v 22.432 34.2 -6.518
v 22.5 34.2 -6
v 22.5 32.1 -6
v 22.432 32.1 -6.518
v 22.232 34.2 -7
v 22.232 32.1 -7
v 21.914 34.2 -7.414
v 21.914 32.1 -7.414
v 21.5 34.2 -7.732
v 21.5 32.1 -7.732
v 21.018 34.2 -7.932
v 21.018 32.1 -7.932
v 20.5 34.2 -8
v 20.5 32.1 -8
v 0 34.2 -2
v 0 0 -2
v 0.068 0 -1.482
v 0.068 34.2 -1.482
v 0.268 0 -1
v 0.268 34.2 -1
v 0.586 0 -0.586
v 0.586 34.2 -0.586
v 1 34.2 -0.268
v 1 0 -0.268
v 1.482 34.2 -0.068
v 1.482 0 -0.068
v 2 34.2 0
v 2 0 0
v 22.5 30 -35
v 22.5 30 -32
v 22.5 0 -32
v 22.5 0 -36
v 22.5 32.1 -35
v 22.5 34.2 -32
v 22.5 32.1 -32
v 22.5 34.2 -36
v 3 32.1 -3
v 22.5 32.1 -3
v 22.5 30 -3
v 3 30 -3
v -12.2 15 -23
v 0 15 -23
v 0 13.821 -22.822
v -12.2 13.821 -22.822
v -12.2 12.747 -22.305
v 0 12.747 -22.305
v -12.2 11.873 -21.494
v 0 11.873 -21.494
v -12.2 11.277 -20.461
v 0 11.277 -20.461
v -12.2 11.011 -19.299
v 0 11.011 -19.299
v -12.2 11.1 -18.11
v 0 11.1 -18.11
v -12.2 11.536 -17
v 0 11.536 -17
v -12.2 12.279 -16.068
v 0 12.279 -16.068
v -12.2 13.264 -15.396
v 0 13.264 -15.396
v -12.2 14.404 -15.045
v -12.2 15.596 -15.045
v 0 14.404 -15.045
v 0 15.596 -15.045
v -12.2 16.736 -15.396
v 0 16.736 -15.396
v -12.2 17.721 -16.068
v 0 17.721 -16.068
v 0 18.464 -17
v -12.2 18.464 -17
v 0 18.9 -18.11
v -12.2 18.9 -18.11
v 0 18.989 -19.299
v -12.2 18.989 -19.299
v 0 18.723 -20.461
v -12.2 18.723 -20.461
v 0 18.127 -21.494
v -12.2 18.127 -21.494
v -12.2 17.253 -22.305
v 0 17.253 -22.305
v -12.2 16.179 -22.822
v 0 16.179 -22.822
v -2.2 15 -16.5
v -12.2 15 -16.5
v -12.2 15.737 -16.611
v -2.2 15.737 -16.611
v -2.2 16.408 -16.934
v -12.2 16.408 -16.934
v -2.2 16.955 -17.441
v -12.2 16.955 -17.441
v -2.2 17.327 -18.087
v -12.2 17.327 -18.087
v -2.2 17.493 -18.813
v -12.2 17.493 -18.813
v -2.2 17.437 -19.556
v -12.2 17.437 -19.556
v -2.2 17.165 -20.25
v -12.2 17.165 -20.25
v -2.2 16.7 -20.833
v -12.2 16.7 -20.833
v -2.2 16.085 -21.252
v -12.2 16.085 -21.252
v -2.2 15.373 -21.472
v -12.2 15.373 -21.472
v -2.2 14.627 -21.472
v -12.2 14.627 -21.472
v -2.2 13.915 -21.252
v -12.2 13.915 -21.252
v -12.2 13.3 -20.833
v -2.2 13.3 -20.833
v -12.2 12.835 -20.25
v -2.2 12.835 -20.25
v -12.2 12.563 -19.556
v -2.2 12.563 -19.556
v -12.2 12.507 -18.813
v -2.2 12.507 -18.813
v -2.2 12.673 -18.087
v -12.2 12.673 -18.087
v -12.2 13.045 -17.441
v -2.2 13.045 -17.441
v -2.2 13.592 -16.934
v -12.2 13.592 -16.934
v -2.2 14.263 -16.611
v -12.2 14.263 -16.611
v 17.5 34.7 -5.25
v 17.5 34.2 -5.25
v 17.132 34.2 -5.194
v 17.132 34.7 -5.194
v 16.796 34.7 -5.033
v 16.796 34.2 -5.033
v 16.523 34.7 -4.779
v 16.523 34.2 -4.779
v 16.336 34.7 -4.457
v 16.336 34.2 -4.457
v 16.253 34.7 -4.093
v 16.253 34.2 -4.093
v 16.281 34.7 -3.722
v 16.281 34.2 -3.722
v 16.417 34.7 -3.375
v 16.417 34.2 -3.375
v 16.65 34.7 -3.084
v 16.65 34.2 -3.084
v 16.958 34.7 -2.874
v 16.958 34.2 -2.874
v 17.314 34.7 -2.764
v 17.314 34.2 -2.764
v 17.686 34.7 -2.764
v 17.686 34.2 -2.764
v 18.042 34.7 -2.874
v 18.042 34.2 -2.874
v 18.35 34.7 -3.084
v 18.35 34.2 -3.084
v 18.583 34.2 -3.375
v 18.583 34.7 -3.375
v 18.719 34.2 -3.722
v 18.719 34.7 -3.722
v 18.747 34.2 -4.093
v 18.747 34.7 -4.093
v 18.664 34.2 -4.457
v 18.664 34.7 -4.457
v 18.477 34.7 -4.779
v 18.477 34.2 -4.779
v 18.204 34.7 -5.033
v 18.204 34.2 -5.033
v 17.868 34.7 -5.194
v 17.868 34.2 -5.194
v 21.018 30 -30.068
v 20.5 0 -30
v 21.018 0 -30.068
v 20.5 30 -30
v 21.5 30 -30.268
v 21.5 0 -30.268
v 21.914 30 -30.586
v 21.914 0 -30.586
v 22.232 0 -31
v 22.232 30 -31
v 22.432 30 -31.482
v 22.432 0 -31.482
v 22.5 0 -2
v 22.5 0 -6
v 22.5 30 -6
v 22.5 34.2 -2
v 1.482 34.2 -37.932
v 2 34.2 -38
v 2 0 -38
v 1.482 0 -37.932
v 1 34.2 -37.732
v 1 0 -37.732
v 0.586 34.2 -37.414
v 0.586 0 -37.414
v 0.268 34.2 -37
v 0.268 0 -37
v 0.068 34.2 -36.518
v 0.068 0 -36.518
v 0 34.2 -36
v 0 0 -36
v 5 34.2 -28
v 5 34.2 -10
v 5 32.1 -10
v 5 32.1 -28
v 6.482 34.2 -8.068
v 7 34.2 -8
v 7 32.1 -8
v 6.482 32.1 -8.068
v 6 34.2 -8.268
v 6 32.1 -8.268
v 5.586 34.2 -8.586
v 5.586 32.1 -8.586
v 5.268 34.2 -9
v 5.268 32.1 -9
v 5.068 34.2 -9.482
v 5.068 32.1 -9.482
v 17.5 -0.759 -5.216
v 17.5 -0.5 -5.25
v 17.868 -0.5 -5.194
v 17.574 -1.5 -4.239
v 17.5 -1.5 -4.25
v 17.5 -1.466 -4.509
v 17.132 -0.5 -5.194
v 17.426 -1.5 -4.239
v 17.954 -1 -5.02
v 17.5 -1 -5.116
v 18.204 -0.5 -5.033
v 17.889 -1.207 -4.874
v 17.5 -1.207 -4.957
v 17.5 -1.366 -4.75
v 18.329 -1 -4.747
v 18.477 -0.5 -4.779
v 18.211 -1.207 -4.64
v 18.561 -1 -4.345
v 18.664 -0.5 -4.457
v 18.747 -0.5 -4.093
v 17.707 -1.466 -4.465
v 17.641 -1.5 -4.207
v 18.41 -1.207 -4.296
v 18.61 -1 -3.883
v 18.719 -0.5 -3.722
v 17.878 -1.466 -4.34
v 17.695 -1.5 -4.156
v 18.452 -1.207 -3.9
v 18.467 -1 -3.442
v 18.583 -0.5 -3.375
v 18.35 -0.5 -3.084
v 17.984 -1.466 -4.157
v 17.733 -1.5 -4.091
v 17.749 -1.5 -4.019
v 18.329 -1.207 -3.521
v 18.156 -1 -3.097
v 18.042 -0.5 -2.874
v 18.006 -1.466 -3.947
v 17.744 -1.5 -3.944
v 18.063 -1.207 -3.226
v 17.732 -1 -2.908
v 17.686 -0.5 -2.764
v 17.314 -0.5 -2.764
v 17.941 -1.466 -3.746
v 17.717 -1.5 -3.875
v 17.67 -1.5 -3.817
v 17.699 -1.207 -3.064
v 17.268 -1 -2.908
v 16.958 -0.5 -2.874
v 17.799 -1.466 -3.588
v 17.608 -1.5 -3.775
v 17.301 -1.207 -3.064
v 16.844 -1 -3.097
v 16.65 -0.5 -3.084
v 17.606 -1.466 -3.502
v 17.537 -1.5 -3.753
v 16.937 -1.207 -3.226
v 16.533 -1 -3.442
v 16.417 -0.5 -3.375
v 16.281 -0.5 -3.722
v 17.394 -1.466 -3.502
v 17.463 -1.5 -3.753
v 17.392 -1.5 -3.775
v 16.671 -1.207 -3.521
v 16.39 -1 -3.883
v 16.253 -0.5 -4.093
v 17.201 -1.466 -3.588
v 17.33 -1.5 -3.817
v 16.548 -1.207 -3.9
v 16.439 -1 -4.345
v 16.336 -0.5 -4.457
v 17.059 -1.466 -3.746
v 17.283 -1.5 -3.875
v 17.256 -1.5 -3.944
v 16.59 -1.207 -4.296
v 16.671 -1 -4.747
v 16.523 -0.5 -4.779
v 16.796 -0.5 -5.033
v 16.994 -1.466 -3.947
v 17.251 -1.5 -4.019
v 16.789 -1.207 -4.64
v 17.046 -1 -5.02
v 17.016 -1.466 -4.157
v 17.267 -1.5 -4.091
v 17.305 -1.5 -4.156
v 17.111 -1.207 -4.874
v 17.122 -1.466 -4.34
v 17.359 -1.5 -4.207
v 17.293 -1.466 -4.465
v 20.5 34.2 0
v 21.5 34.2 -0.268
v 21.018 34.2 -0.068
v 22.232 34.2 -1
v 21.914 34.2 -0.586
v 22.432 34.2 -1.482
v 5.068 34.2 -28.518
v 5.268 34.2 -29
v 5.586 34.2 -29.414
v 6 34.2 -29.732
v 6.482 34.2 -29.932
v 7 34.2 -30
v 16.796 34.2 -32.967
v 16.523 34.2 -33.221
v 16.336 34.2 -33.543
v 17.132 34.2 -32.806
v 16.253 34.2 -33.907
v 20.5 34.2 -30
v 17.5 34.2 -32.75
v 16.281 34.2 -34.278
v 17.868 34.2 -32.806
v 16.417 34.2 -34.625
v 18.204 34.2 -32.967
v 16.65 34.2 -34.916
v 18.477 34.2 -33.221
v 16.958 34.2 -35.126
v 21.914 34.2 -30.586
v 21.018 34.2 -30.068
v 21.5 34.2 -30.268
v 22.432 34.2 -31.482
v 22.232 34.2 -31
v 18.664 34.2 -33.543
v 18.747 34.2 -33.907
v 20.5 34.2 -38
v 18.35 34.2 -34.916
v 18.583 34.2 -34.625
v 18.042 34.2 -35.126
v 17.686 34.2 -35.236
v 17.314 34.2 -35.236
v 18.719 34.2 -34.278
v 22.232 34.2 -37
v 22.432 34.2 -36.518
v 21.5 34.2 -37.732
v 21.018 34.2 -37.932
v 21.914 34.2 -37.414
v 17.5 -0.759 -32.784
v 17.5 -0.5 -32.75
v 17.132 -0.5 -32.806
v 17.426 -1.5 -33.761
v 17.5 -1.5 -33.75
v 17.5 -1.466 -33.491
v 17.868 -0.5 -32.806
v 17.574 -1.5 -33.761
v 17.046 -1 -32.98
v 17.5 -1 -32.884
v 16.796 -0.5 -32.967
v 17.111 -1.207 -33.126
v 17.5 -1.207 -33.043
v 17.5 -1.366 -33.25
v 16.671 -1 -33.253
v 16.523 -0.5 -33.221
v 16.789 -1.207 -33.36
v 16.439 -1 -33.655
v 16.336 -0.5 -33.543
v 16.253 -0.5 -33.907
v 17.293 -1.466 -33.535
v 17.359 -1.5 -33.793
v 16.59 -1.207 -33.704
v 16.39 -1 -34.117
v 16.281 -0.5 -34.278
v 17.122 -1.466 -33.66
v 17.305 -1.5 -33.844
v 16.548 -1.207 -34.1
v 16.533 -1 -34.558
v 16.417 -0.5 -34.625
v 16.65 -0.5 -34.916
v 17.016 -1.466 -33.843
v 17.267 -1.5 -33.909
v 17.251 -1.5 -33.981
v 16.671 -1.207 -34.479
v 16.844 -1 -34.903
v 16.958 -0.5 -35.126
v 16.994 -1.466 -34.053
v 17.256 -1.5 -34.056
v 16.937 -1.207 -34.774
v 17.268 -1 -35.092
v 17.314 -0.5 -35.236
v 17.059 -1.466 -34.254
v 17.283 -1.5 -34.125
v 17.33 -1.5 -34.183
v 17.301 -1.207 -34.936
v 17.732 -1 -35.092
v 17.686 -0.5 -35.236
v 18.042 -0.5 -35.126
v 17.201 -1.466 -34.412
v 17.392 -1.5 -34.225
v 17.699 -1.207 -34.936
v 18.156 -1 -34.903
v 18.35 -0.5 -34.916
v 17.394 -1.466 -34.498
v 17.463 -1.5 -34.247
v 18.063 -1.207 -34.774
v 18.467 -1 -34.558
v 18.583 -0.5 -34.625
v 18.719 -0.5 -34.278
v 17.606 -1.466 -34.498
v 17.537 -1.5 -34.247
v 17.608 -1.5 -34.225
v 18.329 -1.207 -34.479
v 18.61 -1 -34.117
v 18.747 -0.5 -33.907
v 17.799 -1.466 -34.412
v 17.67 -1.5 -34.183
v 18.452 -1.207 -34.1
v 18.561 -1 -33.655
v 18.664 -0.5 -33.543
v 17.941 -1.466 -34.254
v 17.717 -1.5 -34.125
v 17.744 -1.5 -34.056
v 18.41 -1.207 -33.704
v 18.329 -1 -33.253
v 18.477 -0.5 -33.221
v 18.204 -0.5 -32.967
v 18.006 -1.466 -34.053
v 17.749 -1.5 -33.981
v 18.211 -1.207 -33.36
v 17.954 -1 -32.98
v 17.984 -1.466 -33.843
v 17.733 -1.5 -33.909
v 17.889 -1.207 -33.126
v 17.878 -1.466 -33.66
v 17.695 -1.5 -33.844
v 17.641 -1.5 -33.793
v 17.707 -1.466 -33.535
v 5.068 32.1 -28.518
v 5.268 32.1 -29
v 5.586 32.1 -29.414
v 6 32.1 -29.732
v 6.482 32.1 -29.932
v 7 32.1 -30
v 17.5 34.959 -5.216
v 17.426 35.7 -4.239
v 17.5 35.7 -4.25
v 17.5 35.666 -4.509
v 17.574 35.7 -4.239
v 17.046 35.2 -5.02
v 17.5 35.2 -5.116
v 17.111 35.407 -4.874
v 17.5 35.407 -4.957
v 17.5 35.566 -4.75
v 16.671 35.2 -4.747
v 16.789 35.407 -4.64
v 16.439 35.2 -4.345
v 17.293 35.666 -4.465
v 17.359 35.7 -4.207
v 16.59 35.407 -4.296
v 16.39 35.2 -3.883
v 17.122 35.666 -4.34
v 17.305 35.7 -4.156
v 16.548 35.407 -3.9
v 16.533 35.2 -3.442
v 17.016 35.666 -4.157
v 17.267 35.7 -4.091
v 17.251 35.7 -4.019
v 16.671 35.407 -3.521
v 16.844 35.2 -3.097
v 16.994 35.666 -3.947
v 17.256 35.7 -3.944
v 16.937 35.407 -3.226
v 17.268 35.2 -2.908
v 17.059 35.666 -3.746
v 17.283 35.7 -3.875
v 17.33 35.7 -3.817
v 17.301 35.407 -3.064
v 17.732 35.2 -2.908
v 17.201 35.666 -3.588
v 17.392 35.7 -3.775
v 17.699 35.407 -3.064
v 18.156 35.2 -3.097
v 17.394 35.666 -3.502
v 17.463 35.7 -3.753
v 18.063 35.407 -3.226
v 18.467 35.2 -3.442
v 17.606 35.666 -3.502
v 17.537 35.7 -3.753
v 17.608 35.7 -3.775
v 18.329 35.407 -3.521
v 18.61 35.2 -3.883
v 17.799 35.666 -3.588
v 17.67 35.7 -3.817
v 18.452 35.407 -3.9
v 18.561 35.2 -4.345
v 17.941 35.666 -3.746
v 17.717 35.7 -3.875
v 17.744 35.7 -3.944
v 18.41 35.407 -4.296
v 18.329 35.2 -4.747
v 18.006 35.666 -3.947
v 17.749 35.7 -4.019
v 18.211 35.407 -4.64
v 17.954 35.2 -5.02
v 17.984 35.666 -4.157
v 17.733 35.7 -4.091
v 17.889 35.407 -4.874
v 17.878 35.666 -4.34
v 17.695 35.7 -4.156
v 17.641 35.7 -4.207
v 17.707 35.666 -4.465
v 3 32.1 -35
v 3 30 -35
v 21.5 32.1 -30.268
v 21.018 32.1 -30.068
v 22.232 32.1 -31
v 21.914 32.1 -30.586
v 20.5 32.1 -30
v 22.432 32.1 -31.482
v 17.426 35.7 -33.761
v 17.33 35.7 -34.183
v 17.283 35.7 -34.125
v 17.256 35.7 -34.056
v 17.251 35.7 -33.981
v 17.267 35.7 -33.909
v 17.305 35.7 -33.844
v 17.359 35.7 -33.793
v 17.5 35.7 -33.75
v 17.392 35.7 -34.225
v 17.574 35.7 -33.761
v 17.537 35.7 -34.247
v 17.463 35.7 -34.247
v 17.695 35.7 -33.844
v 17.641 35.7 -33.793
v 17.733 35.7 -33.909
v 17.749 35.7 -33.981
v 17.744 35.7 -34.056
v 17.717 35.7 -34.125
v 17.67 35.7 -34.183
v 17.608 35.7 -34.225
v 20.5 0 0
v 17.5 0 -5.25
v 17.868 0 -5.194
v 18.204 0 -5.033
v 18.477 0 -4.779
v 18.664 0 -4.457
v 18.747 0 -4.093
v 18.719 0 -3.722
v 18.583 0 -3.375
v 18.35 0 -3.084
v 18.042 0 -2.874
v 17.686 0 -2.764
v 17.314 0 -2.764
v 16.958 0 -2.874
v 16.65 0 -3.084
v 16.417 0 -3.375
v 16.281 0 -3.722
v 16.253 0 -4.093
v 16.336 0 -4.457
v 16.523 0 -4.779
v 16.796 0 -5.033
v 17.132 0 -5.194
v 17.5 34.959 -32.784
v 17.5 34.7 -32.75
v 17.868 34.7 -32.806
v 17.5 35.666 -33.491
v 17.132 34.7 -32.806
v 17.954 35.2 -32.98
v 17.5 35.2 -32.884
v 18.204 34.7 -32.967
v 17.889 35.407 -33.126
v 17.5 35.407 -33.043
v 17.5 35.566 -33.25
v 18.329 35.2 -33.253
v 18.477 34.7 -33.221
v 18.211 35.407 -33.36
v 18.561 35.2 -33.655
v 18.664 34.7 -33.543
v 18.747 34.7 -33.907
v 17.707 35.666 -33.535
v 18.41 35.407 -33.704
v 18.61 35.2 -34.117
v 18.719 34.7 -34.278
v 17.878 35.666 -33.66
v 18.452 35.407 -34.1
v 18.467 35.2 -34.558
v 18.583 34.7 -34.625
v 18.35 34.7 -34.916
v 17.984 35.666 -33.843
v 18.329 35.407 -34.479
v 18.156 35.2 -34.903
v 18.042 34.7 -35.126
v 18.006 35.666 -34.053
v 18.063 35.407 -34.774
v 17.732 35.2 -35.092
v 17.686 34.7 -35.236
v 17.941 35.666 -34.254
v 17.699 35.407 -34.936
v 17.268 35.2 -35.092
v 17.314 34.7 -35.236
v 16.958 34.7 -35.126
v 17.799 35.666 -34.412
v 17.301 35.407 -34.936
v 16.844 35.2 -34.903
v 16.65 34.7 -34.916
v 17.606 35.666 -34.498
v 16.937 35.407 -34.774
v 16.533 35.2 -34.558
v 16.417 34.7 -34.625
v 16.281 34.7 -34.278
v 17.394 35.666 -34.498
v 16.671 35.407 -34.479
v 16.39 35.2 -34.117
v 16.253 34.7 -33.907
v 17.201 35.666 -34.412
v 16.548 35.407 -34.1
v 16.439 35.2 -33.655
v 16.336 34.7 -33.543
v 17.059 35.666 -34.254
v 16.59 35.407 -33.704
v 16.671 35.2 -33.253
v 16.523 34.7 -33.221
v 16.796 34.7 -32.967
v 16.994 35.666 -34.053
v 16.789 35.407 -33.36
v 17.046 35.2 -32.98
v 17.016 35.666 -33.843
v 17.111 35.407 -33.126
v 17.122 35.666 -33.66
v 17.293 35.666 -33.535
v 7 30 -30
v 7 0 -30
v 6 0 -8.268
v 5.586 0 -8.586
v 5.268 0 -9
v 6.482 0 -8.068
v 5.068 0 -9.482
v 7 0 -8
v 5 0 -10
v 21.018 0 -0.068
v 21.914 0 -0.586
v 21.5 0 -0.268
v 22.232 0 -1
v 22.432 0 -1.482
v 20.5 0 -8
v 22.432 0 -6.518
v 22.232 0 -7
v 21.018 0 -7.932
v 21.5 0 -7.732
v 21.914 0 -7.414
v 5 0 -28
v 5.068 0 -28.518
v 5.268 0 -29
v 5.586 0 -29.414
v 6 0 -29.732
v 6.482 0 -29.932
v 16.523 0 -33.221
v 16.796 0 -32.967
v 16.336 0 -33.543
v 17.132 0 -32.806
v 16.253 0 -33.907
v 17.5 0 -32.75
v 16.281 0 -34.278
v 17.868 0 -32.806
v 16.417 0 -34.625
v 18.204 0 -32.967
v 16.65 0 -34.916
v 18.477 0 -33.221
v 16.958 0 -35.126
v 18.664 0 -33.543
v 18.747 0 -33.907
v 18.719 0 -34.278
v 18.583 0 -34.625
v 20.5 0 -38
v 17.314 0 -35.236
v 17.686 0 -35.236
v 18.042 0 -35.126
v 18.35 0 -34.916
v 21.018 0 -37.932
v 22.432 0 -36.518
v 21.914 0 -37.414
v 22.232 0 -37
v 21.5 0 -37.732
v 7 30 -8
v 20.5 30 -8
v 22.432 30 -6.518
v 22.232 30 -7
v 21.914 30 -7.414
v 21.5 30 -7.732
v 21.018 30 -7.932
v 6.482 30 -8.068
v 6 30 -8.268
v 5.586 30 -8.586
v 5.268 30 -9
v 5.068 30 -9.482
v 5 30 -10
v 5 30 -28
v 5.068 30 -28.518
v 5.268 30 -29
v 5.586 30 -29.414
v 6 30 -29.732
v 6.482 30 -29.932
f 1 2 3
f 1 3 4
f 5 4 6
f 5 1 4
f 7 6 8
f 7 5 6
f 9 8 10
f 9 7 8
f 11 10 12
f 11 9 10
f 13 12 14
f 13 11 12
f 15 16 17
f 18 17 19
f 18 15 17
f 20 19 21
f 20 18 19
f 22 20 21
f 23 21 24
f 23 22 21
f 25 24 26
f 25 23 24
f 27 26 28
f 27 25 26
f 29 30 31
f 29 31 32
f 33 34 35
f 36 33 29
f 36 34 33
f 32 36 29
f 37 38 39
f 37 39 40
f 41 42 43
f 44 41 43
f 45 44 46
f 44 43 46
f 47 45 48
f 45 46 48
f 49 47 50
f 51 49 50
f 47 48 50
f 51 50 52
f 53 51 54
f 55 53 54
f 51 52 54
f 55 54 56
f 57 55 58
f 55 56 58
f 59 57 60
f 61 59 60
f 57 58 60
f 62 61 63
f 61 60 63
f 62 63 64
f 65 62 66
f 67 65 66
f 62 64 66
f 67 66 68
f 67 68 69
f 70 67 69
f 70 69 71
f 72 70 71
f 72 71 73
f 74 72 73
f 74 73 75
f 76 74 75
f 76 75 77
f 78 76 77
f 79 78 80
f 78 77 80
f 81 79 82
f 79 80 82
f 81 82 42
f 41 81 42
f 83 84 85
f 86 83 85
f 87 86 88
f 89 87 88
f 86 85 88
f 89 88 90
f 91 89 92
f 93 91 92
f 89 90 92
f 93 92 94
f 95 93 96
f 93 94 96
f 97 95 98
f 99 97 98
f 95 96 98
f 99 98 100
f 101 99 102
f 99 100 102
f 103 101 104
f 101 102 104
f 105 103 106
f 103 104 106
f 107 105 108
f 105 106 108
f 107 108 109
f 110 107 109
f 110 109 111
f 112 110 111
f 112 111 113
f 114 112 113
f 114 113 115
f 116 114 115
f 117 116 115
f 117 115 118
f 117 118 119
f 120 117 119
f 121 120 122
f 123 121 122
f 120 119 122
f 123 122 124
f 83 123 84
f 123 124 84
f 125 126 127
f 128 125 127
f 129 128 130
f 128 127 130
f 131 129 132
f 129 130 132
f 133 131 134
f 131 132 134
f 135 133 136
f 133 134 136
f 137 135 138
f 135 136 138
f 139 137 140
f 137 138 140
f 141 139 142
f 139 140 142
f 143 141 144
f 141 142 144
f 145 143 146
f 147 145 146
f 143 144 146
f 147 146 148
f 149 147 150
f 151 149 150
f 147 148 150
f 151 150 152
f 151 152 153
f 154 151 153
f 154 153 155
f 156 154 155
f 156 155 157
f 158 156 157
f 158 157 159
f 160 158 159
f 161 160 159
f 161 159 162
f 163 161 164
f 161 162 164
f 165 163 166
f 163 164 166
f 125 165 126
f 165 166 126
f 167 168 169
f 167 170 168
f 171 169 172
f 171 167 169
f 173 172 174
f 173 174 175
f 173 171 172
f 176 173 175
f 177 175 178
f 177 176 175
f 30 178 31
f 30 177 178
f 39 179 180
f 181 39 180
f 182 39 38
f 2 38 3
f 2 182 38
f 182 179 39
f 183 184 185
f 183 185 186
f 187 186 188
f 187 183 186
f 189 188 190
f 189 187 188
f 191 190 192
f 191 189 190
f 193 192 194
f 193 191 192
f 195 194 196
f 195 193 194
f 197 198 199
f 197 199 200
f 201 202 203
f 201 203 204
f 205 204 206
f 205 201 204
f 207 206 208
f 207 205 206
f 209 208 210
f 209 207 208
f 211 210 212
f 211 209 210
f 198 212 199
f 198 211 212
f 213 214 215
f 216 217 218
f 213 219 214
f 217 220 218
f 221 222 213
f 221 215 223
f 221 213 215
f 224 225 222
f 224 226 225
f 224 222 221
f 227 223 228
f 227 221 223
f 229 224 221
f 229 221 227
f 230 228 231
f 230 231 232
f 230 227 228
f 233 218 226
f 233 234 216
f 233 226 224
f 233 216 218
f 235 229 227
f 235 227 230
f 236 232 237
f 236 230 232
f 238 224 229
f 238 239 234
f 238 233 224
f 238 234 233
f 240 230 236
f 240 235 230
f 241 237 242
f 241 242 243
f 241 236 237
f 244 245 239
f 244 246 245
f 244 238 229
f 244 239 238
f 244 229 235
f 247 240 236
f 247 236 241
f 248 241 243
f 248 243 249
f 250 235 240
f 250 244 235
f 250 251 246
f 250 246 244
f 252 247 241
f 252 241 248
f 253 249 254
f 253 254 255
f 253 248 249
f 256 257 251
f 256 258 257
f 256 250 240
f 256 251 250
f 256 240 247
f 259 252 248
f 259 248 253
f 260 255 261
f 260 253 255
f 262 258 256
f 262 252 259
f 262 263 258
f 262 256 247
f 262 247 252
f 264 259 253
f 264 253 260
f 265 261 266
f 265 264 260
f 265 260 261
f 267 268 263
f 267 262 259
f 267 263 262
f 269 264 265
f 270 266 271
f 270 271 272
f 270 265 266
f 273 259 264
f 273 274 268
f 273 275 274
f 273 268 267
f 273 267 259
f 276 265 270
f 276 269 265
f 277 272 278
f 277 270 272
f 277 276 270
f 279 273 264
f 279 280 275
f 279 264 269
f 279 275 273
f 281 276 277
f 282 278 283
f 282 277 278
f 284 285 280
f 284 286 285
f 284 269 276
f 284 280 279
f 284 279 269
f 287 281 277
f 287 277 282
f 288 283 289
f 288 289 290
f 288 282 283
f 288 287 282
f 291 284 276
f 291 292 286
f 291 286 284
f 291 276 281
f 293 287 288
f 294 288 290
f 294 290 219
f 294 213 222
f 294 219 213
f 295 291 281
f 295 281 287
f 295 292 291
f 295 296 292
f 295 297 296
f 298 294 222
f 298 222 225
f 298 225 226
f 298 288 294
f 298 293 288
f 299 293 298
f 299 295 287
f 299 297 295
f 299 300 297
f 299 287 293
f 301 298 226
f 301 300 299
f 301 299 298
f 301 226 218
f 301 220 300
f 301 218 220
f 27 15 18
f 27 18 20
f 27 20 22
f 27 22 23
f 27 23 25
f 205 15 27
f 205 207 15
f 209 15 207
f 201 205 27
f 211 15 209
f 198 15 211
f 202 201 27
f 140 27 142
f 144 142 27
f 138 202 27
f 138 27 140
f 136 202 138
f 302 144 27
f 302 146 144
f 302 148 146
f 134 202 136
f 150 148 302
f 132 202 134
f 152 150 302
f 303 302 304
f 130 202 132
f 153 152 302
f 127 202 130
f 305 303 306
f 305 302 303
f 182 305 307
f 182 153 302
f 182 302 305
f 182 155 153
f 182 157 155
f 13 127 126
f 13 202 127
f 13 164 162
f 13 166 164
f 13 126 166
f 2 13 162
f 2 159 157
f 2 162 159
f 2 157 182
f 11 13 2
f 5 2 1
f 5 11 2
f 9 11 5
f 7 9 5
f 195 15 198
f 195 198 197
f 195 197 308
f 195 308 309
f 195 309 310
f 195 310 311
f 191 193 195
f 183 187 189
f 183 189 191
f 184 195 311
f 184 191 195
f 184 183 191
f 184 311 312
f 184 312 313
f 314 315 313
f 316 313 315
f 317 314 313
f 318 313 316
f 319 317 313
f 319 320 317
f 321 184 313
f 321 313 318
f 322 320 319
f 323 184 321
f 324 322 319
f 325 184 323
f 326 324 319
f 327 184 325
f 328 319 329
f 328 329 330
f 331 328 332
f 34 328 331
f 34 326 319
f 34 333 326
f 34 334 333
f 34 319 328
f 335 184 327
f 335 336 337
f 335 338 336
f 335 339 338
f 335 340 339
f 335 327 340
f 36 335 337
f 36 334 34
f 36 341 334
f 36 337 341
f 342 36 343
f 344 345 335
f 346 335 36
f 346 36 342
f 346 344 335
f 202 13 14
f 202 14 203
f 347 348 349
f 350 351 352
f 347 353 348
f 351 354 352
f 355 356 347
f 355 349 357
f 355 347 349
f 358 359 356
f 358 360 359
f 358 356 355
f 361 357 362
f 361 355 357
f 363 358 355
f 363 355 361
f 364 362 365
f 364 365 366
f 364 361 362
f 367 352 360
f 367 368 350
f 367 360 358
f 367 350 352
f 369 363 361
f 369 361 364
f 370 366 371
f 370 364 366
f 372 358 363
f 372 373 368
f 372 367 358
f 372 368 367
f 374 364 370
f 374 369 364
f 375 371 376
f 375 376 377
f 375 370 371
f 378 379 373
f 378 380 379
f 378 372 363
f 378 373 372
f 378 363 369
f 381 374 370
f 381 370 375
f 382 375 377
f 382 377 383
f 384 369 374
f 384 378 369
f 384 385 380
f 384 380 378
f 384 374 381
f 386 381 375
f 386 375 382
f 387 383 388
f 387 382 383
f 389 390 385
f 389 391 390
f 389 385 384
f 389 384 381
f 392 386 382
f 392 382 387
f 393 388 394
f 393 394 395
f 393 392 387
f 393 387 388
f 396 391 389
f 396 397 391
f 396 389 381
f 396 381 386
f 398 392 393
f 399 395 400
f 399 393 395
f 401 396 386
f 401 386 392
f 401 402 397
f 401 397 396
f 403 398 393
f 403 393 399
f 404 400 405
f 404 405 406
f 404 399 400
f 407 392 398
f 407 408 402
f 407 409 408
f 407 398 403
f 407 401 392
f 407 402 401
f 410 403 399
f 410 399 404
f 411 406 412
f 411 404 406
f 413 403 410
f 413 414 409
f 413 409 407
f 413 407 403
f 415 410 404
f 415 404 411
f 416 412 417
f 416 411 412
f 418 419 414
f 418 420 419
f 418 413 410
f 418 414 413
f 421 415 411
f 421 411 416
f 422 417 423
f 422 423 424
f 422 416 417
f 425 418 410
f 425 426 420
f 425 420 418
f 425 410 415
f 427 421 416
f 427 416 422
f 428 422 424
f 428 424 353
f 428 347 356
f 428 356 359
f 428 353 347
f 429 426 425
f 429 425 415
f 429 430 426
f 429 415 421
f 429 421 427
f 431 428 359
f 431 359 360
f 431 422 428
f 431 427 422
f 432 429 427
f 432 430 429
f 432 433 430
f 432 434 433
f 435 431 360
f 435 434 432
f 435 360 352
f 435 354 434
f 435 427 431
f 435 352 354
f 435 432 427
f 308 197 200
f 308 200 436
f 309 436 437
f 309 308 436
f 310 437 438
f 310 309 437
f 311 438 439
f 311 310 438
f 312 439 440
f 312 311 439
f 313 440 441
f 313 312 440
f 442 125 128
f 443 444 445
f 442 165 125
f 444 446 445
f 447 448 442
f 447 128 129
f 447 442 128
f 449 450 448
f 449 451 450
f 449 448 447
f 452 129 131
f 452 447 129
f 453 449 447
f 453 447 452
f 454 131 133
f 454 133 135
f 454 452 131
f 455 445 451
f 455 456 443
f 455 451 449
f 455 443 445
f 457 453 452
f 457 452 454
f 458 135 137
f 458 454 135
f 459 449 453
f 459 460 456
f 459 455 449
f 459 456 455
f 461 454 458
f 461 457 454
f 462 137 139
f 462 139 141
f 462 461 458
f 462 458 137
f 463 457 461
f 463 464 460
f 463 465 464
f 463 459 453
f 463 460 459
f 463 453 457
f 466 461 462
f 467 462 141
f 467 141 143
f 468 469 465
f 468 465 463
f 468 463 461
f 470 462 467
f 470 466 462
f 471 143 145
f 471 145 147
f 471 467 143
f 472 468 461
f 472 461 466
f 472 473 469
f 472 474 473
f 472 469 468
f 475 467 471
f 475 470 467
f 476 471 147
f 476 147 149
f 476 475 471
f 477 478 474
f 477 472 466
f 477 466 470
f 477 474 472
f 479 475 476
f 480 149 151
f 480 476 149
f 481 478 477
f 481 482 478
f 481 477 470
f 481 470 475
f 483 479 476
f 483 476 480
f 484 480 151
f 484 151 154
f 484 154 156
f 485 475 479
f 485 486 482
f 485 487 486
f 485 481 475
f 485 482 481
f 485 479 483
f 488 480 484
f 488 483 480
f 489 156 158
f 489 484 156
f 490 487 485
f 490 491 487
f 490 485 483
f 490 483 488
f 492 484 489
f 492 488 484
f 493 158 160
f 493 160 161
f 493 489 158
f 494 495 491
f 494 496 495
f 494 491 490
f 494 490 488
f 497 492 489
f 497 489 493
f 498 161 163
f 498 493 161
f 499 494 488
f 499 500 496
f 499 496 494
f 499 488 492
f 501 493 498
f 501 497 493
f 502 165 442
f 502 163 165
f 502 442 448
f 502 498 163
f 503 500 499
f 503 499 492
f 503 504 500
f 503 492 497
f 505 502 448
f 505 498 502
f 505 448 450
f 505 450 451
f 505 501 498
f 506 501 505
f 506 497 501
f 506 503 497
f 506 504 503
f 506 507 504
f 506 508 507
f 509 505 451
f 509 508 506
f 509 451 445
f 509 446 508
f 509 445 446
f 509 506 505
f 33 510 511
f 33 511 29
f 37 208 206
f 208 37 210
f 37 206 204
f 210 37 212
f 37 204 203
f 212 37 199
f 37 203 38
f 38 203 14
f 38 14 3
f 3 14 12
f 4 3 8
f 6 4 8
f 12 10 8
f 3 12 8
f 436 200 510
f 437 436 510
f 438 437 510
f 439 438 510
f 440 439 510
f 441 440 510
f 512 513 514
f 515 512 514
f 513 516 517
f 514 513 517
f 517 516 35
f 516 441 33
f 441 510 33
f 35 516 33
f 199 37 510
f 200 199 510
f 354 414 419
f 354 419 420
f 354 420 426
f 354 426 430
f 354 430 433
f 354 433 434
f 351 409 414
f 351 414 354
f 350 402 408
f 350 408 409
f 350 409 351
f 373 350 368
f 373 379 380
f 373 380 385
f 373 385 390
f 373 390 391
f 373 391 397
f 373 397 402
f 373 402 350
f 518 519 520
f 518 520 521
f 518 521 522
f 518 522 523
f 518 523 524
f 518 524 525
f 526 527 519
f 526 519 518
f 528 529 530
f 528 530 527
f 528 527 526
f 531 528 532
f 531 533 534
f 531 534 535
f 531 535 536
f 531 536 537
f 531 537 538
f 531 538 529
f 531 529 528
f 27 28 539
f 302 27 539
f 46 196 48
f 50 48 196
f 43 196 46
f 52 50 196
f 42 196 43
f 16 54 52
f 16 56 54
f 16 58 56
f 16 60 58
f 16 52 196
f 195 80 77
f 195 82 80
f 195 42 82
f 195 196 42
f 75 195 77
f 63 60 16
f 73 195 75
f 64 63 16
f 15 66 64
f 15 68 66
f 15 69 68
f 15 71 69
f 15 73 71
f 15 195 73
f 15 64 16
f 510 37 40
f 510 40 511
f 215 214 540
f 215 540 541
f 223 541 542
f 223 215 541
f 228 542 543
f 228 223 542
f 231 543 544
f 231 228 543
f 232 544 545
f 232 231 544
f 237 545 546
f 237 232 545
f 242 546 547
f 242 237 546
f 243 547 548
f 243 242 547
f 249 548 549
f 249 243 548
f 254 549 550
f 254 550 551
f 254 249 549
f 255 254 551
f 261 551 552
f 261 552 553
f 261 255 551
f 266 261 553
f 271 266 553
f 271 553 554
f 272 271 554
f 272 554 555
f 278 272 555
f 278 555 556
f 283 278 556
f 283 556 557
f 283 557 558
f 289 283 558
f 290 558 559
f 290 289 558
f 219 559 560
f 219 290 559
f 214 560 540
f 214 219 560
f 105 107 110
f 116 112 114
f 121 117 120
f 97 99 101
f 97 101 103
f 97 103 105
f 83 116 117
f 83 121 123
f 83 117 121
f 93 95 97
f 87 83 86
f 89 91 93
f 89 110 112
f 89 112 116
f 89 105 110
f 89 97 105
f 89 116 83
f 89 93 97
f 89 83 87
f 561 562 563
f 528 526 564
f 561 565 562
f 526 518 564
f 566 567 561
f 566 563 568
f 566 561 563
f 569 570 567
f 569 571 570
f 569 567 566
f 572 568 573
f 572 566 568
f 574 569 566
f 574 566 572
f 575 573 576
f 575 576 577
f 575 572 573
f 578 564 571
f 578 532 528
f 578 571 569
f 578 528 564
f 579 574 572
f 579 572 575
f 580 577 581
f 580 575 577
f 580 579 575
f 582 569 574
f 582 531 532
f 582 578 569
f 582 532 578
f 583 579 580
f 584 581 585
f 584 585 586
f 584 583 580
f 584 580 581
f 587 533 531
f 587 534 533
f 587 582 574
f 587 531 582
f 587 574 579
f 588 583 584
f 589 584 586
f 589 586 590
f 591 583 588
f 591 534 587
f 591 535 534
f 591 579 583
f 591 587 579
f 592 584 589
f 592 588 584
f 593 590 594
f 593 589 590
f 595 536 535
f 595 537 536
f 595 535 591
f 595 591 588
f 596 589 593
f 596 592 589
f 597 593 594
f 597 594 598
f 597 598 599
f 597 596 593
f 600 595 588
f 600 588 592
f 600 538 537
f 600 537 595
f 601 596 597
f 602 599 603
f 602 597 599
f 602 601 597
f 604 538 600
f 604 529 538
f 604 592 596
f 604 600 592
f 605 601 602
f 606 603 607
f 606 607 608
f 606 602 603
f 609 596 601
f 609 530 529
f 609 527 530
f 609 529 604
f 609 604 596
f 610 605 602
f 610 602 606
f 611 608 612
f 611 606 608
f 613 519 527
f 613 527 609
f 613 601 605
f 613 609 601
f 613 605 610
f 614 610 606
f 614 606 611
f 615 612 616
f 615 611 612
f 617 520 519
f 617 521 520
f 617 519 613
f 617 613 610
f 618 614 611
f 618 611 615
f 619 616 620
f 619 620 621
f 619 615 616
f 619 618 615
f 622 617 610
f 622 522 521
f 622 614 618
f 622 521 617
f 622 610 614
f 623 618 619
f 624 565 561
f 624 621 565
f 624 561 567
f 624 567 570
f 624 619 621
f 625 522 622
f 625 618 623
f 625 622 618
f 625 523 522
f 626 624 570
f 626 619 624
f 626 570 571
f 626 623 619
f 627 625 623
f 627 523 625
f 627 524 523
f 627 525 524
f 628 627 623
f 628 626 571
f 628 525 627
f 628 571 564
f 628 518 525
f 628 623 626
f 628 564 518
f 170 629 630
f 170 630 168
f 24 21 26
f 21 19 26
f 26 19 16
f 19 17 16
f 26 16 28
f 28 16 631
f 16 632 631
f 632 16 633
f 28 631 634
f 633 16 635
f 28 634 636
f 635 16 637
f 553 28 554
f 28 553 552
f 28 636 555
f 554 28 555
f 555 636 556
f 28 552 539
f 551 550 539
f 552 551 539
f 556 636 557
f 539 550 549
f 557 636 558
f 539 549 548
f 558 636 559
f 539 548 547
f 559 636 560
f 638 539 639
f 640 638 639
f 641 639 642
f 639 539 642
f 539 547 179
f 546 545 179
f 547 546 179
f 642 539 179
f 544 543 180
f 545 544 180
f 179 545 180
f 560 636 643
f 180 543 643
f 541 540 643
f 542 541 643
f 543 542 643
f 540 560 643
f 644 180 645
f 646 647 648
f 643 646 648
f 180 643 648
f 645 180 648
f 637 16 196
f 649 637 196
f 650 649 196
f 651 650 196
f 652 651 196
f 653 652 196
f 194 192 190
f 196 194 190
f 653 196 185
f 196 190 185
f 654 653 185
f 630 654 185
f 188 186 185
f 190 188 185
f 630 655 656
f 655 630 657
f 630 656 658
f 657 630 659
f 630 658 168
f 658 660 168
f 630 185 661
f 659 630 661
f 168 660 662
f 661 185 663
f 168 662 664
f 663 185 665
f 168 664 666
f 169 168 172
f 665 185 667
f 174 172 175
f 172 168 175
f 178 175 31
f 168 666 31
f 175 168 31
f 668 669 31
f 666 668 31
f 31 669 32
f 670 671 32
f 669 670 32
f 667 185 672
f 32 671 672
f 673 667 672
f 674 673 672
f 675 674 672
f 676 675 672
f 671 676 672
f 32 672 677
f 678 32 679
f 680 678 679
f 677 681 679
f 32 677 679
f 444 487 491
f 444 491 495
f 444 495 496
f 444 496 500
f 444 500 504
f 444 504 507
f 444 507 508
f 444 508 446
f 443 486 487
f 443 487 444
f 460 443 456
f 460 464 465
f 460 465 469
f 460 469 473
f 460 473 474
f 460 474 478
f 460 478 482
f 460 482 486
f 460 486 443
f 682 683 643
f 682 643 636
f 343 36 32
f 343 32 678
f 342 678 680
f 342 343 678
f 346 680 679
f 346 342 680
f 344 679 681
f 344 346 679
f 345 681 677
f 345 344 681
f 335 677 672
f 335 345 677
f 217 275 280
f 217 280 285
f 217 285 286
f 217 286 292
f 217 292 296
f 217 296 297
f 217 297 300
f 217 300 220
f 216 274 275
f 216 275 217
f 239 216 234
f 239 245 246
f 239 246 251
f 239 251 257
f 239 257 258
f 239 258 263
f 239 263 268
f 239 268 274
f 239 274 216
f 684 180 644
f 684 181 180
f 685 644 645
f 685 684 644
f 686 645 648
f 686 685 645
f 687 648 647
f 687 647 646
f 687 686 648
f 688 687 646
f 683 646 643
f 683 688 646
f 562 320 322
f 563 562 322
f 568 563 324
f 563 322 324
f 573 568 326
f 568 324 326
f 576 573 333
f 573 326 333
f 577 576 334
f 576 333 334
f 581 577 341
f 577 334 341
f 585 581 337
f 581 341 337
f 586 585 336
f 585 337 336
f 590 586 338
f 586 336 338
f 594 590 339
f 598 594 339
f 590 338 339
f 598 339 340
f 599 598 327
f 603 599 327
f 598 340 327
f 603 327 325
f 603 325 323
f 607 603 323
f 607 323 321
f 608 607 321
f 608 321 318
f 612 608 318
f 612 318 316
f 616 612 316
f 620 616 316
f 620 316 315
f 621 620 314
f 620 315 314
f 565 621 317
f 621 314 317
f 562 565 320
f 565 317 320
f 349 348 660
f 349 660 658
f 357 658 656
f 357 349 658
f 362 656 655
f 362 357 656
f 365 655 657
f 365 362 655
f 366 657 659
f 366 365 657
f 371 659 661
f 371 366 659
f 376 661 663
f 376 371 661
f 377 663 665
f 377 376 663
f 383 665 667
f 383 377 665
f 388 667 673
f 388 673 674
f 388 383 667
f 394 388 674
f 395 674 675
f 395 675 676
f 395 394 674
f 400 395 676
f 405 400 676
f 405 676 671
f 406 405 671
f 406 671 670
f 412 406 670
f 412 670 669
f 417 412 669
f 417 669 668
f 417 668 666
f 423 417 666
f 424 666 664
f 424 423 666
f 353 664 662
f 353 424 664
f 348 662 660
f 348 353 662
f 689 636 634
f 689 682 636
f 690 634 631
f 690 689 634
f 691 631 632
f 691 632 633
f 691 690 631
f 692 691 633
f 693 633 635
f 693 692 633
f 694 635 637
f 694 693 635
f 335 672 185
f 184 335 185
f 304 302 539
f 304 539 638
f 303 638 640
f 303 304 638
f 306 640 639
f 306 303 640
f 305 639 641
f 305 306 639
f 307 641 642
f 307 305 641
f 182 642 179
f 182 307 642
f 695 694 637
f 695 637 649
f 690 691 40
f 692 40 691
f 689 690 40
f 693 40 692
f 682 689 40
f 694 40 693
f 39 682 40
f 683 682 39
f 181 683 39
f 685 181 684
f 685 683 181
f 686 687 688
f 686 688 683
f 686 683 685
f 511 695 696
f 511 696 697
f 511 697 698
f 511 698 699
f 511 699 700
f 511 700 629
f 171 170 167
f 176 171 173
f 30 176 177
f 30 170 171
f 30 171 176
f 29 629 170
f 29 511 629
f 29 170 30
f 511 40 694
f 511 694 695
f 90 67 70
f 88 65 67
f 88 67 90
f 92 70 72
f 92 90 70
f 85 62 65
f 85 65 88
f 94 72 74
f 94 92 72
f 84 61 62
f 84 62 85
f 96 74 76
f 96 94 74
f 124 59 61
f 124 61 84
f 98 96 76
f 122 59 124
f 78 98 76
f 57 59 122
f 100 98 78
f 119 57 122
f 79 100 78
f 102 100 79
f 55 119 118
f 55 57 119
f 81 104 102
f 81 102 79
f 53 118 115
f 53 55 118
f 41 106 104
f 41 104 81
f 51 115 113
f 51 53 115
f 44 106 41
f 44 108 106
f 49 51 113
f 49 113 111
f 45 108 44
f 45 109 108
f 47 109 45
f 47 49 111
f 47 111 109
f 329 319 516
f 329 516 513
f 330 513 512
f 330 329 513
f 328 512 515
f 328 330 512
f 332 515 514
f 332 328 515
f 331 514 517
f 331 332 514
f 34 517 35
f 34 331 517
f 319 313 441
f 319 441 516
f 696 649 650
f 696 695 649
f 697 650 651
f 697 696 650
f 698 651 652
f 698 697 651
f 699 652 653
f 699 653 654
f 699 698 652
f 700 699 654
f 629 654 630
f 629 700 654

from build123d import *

# Parameters (mm, degrees)
SALIENTE_EXTRUIR1_DEPTH = 30
REDONDEO1_R             = 2
CROQUIS2_R              = 4
SALIENTE_EXTRUIR2_DEPTH = 12.2
SALIENTE_EXTRUIR3_START = 2.1
SALIENTE_EXTRUIR3_DEPTH = 2.1
SALIENTE_EXTRUIR4_START = 2.1
SALIENTE_EXTRUIR4_DEPTH = 2.1
CROQUIS5_R              = 1.25
SALIENTE_EXTRUIR5_DEPTH = 1.5
REDONDEO2_R             = 1
SALIENTE_EXTRUIR6_START = 1.5
CROQUIS6_R              = 1.25
SALIENTE_EXTRUIR6_DEPTH = 1.5
REDONDEO3_R             = 1
CROQUIS7_R              = 2.5
CORTAR_EXTRUIR1_DEPTH   = 10


with BuildPart() as part:
    # Croquis1 → Saliente-Extruir1 (new body)
    with BuildSketch(Plane(origin=(0, 0, 0), x_dir=(1, 0, 0), z_dir=(0, 1, 0))):
        Polygon((0, 0), (22.5, 0), (22.5, 8), (5, 8), (5, 30), (22.5, 30), (22.5, 38), (0, 38), align=None)
    extrude(amount=SALIENTE_EXTRUIR1_DEPTH)

    # Redondeo1
    redondeo1_edges = [part.edges().sort_by_distance(p)[0] for p in [
        (0, 15, -38),
        (22.5, 15, -38),
        (22.5, 15, -30),
        (5, 15, -30),
        (5, 15, -8),
        (22.5, 15, -8),
        (22.5, 15, 0),
        (0, 15, 0),
    ]]
    fillet(redondeo1_edges, radius=REDONDEO1_R)

    # Croquis2 → Saliente-Extruir2 (add)
    with BuildSketch(Plane.ZY):
        with Locations(Location((-19, 15, 0), (0, 0, 180))):
            Circle(CROQUIS2_R)
    extrude(amount=SALIENTE_EXTRUIR2_DEPTH)

    # Croquis3 → Saliente-Extruir3 (add)
    with BuildSketch(Plane(origin=(0, 30, 0), x_dir=(1, 0, 0), z_dir=(0, 1, 0)).offset(SALIENTE_EXTRUIR3_START)):
        with BuildLine():
            Line((20.5, 38), (2, 38))
            ThreePointArc((2, 38), (0.585786438, 37.414213562), (0, 36))
            Line((0, 36), (0, 2))
            ThreePointArc((0, 2), (0.585786438, 0.585786438), (2, 0))
            Line((2, 0), (20.5, 0))
            ThreePointArc((20.5, 0), (21.914213562, 0.585786438), (22.5, 2))
            Line((22.5, 2), (22.5, 3))
            Line((22.5, 3), (3, 3))
            Line((3, 3), (3, 35))
            Line((3, 35), (22.5, 35))
            Line((22.5, 35), (22.5, 36))
            ThreePointArc((22.5, 36), (21.914213562, 37.414213562), (20.5, 38))
        make_face()
    extrude(amount=-SALIENTE_EXTRUIR3_DEPTH)

    # Croquis4 → Saliente-Extruir4 (add)
    with BuildSketch(Plane(origin=(0, 32.1, 0), x_dir=(1, 0, 0), z_dir=(0, 1, 0)).offset(SALIENTE_EXTRUIR4_START)):
        with BuildLine():
            Line((22.5, 32), (22.5, 36))
            ThreePointArc((22.5, 36), (21.914213562, 37.414213562), (20.5, 38))
            Line((20.5, 38), (2, 38))
            ThreePointArc((2, 38), (0.585786438, 37.414213562), (0, 36))
            Line((0, 36), (0, 2))
            ThreePointArc((0, 2), (0.585786438, 0.585786438), (2, 0))
            Line((2, 0), (20.5, 0))
            ThreePointArc((20.5, 0), (21.914213562, 0.585786438), (22.5, 2))
            Line((22.5, 2), (22.5, 6))
            ThreePointArc((22.5, 6), (21.914213562, 7.414213562), (20.5, 8))
            Line((20.5, 8), (7, 8))
            ThreePointArc((7, 8), (5.585786438, 8.585786438), (5, 10))
            Line((5, 10), (5, 28))
            ThreePointArc((5, 28), (5.585786438, 29.414213562), (7, 30))
            Line((7, 30), (20.5, 30))
            ThreePointArc((20.5, 30), (21.914213562, 30.585786438), (22.5, 32))
        make_face()
    extrude(amount=-SALIENTE_EXTRUIR4_DEPTH)

    # Croquis5 → Saliente-Extruir5 (add)
    with BuildSketch(Plane(origin=(0, 34.2, 0), x_dir=(1, 0, 0), z_dir=(0, 1, 0))):
        with Locations(Location((17.5, 34, 0), (0, 0, 270))):
            Circle(CROQUIS5_R)
        with Locations(Location((17.5, 4, 0), (0, 0, 90))):
            Circle(CROQUIS5_R)
    extrude(amount=SALIENTE_EXTRUIR5_DEPTH)

    # Redondeo2
    redondeo2_edges = [part.edges().sort_by_distance(p)[0] for p in [
        (17.5, 35.7, -35.25),
        (17.5, 35.7, -2.75),
    ]]
    fillet(redondeo2_edges, radius=REDONDEO2_R)

    # Croquis6 → Saliente-Extruir6 (add)
    with BuildSketch(Plane.XZ.offset(SALIENTE_EXTRUIR6_START)):
        with Locations(Location((17.5, -4, 0), (0, 0, 270))):
            Circle(CROQUIS6_R)
        with Locations(Location((17.5, -34, 0), (0, 0, 90))):
            Circle(CROQUIS6_R)
    extrude(amount=-SALIENTE_EXTRUIR6_DEPTH)

    # Redondeo3
    redondeo3_edges = [part.edges().sort_by_distance(p)[0] for p in [
        (17.5, -1.5, -2.75),
        (17.5, -1.5, -35.25),
    ]]
    fillet(redondeo3_edges, radius=REDONDEO3_R)

    # Croquis7 → Cortar-Extruir1 (cut)
    with BuildSketch(Plane.ZY.offset(12.2)):
        with Locations((-19, 15)):
            Circle(CROQUIS7_R)
    extrude(amount=-CORTAR_EXTRUIR1_DEPTH, mode=Mode.SUBTRACT)


solid = part.part
